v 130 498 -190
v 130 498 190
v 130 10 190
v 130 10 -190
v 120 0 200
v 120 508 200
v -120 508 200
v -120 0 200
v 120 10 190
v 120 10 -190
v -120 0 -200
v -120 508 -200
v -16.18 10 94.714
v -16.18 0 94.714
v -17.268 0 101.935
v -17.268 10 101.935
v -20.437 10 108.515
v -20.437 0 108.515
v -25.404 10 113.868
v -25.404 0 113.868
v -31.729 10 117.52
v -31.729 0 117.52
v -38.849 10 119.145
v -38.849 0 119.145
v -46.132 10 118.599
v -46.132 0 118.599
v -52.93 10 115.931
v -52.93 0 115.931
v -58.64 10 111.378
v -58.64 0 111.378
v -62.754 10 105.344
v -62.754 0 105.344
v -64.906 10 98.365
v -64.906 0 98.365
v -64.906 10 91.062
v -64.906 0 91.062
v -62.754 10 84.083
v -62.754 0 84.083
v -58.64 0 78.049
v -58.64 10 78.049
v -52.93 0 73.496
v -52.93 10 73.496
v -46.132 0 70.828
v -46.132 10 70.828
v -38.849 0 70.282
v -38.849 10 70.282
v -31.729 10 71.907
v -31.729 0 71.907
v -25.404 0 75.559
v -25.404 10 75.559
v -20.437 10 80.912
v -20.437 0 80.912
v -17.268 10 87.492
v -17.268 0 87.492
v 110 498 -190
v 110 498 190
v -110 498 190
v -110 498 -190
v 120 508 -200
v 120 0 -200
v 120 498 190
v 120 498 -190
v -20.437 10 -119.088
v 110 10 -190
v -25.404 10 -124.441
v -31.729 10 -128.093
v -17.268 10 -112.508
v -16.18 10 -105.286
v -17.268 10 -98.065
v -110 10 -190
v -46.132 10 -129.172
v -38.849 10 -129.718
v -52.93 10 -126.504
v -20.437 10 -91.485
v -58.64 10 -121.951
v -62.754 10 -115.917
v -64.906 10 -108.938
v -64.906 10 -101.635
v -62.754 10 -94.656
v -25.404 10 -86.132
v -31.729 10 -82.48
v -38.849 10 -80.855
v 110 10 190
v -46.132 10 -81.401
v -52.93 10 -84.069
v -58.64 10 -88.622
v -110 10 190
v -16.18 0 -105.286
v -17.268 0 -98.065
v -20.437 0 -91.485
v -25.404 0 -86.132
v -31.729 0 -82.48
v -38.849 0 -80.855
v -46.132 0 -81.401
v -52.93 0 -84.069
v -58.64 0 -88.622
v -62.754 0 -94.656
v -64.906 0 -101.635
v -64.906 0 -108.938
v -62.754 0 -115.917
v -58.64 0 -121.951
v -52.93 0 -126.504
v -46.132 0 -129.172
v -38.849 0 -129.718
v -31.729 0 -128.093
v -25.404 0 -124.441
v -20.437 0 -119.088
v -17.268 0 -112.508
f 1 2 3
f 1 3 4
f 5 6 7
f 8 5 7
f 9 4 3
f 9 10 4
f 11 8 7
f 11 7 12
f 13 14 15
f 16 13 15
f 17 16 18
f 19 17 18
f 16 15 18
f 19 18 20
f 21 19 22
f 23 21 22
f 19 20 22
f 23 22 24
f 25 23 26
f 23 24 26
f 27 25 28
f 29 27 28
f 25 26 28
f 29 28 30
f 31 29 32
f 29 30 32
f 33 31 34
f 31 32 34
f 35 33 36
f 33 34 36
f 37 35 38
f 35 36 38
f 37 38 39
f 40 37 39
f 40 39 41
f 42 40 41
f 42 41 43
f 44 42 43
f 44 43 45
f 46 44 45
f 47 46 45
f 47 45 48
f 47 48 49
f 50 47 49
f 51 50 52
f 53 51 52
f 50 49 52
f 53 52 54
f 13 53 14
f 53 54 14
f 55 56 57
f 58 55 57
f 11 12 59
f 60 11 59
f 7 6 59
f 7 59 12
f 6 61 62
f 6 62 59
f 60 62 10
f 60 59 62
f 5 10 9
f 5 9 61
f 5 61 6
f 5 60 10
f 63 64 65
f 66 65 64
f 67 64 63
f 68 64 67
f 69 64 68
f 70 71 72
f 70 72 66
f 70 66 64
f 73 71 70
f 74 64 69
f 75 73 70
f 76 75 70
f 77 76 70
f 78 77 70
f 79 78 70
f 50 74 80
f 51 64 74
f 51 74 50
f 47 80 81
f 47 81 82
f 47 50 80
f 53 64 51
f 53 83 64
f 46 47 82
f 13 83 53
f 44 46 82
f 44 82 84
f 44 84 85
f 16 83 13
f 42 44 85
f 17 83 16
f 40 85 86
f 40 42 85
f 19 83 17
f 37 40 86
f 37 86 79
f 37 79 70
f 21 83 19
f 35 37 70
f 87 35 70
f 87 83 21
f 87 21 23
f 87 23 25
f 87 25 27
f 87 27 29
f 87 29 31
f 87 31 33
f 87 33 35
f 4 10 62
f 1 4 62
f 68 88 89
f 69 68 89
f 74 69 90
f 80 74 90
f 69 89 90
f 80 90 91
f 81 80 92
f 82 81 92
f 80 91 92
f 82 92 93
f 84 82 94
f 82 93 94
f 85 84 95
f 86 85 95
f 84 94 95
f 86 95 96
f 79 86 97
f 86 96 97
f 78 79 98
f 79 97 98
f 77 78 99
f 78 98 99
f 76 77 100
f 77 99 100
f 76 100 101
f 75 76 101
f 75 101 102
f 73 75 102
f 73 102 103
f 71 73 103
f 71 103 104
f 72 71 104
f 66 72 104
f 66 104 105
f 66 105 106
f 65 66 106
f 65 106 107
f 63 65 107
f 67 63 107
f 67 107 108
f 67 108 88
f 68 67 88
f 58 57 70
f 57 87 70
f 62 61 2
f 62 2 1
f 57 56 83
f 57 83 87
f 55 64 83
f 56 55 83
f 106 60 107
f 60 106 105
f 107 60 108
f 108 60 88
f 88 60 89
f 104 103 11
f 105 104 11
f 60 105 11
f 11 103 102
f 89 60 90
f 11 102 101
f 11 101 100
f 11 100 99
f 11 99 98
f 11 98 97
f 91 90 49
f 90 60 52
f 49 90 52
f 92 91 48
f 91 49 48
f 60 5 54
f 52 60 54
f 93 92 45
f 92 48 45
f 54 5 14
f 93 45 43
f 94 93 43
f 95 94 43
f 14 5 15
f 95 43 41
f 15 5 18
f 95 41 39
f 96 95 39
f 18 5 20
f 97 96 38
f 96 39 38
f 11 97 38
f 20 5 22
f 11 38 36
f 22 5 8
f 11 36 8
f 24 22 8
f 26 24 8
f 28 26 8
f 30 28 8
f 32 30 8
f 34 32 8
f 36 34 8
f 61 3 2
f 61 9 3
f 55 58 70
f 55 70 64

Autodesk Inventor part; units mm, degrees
ref_plane "YZ Plane" through (0, 0, 0) normal (1, 0, 0) x (0, 1, 0)
ref_plane "XZ Plane" through (0, 0, 0) normal (0, 1, 0) x (-1, 0, 0)
ref_plane "XY Plane" through (0, 0, 0) normal (0, 0, 1) x (1, 0, 0)
sketch "Sketch1" plane through (0, 0, 0) normal (0, 1, 0) x (-1, 0, 0)
  line L0 (-120, 200) -> (120, 200)
  line L1 (120, 200) -> (120, -200)
  line L2 (120, -200) -> (-120, -200)
  line L3 (-120, -200) -> (-120, 200)
  line L4 (-120, 200) -> (120, -200) construction
  line L5 (120, 200) -> (-120, -200) construction
  point P0 (0, 0)
  dimension "d0" = 400
  dimension "d1" = 240
extrude "Extrusion1" add sketch "Sketch1" along normal blind 508
sketch "Sketch2" plane through (0, 0, 0) normal (0, -1, 0) x (1, 0, 0)
  point P0 (0, 0)
sketch "Sketch3" plane through (0, 0, 0) normal (0, -1, 0) x (1, 0, 0)
  circle A0 centre (-40.68, 94.7135) radius 24.5
  circle A1 centre (-40.68, -105.2865) radius 24.5
  line L0 (-120, 200) -> (-120, -200) projected
  point P0 (0, 0)
  dimension "d4" = 49
  dimension "d5" = 49
  dimension "d6" = 200
  dimension "d17" = 79.32
  dimension "d18" = 79.32
shell "Shell1" thickness 10 removed faces 0
extrude "Extrusion2" cut sketch "Sketch3" against normal blind 10
sketch "Sketch4" plane through (120, 0, 200) normal (1, 0, 0) x (0, 0, -1)
  line L0 (10, 498) -> (390, 498) projected
  line L1 (390, 10) -> (390, 498) projected
  line L2 (10, 498) -> (390, 498)
  line L3 (390, 498) -> (390, 10)
  line L4 (390, 10) -> (10, 10)
  line L5 (10, 10) -> (10, 498)
  point P0 (200, 0)
extrude "Extrusion3" add sketch "Sketch4" along normal blind 10
properties part number "powerBox"
